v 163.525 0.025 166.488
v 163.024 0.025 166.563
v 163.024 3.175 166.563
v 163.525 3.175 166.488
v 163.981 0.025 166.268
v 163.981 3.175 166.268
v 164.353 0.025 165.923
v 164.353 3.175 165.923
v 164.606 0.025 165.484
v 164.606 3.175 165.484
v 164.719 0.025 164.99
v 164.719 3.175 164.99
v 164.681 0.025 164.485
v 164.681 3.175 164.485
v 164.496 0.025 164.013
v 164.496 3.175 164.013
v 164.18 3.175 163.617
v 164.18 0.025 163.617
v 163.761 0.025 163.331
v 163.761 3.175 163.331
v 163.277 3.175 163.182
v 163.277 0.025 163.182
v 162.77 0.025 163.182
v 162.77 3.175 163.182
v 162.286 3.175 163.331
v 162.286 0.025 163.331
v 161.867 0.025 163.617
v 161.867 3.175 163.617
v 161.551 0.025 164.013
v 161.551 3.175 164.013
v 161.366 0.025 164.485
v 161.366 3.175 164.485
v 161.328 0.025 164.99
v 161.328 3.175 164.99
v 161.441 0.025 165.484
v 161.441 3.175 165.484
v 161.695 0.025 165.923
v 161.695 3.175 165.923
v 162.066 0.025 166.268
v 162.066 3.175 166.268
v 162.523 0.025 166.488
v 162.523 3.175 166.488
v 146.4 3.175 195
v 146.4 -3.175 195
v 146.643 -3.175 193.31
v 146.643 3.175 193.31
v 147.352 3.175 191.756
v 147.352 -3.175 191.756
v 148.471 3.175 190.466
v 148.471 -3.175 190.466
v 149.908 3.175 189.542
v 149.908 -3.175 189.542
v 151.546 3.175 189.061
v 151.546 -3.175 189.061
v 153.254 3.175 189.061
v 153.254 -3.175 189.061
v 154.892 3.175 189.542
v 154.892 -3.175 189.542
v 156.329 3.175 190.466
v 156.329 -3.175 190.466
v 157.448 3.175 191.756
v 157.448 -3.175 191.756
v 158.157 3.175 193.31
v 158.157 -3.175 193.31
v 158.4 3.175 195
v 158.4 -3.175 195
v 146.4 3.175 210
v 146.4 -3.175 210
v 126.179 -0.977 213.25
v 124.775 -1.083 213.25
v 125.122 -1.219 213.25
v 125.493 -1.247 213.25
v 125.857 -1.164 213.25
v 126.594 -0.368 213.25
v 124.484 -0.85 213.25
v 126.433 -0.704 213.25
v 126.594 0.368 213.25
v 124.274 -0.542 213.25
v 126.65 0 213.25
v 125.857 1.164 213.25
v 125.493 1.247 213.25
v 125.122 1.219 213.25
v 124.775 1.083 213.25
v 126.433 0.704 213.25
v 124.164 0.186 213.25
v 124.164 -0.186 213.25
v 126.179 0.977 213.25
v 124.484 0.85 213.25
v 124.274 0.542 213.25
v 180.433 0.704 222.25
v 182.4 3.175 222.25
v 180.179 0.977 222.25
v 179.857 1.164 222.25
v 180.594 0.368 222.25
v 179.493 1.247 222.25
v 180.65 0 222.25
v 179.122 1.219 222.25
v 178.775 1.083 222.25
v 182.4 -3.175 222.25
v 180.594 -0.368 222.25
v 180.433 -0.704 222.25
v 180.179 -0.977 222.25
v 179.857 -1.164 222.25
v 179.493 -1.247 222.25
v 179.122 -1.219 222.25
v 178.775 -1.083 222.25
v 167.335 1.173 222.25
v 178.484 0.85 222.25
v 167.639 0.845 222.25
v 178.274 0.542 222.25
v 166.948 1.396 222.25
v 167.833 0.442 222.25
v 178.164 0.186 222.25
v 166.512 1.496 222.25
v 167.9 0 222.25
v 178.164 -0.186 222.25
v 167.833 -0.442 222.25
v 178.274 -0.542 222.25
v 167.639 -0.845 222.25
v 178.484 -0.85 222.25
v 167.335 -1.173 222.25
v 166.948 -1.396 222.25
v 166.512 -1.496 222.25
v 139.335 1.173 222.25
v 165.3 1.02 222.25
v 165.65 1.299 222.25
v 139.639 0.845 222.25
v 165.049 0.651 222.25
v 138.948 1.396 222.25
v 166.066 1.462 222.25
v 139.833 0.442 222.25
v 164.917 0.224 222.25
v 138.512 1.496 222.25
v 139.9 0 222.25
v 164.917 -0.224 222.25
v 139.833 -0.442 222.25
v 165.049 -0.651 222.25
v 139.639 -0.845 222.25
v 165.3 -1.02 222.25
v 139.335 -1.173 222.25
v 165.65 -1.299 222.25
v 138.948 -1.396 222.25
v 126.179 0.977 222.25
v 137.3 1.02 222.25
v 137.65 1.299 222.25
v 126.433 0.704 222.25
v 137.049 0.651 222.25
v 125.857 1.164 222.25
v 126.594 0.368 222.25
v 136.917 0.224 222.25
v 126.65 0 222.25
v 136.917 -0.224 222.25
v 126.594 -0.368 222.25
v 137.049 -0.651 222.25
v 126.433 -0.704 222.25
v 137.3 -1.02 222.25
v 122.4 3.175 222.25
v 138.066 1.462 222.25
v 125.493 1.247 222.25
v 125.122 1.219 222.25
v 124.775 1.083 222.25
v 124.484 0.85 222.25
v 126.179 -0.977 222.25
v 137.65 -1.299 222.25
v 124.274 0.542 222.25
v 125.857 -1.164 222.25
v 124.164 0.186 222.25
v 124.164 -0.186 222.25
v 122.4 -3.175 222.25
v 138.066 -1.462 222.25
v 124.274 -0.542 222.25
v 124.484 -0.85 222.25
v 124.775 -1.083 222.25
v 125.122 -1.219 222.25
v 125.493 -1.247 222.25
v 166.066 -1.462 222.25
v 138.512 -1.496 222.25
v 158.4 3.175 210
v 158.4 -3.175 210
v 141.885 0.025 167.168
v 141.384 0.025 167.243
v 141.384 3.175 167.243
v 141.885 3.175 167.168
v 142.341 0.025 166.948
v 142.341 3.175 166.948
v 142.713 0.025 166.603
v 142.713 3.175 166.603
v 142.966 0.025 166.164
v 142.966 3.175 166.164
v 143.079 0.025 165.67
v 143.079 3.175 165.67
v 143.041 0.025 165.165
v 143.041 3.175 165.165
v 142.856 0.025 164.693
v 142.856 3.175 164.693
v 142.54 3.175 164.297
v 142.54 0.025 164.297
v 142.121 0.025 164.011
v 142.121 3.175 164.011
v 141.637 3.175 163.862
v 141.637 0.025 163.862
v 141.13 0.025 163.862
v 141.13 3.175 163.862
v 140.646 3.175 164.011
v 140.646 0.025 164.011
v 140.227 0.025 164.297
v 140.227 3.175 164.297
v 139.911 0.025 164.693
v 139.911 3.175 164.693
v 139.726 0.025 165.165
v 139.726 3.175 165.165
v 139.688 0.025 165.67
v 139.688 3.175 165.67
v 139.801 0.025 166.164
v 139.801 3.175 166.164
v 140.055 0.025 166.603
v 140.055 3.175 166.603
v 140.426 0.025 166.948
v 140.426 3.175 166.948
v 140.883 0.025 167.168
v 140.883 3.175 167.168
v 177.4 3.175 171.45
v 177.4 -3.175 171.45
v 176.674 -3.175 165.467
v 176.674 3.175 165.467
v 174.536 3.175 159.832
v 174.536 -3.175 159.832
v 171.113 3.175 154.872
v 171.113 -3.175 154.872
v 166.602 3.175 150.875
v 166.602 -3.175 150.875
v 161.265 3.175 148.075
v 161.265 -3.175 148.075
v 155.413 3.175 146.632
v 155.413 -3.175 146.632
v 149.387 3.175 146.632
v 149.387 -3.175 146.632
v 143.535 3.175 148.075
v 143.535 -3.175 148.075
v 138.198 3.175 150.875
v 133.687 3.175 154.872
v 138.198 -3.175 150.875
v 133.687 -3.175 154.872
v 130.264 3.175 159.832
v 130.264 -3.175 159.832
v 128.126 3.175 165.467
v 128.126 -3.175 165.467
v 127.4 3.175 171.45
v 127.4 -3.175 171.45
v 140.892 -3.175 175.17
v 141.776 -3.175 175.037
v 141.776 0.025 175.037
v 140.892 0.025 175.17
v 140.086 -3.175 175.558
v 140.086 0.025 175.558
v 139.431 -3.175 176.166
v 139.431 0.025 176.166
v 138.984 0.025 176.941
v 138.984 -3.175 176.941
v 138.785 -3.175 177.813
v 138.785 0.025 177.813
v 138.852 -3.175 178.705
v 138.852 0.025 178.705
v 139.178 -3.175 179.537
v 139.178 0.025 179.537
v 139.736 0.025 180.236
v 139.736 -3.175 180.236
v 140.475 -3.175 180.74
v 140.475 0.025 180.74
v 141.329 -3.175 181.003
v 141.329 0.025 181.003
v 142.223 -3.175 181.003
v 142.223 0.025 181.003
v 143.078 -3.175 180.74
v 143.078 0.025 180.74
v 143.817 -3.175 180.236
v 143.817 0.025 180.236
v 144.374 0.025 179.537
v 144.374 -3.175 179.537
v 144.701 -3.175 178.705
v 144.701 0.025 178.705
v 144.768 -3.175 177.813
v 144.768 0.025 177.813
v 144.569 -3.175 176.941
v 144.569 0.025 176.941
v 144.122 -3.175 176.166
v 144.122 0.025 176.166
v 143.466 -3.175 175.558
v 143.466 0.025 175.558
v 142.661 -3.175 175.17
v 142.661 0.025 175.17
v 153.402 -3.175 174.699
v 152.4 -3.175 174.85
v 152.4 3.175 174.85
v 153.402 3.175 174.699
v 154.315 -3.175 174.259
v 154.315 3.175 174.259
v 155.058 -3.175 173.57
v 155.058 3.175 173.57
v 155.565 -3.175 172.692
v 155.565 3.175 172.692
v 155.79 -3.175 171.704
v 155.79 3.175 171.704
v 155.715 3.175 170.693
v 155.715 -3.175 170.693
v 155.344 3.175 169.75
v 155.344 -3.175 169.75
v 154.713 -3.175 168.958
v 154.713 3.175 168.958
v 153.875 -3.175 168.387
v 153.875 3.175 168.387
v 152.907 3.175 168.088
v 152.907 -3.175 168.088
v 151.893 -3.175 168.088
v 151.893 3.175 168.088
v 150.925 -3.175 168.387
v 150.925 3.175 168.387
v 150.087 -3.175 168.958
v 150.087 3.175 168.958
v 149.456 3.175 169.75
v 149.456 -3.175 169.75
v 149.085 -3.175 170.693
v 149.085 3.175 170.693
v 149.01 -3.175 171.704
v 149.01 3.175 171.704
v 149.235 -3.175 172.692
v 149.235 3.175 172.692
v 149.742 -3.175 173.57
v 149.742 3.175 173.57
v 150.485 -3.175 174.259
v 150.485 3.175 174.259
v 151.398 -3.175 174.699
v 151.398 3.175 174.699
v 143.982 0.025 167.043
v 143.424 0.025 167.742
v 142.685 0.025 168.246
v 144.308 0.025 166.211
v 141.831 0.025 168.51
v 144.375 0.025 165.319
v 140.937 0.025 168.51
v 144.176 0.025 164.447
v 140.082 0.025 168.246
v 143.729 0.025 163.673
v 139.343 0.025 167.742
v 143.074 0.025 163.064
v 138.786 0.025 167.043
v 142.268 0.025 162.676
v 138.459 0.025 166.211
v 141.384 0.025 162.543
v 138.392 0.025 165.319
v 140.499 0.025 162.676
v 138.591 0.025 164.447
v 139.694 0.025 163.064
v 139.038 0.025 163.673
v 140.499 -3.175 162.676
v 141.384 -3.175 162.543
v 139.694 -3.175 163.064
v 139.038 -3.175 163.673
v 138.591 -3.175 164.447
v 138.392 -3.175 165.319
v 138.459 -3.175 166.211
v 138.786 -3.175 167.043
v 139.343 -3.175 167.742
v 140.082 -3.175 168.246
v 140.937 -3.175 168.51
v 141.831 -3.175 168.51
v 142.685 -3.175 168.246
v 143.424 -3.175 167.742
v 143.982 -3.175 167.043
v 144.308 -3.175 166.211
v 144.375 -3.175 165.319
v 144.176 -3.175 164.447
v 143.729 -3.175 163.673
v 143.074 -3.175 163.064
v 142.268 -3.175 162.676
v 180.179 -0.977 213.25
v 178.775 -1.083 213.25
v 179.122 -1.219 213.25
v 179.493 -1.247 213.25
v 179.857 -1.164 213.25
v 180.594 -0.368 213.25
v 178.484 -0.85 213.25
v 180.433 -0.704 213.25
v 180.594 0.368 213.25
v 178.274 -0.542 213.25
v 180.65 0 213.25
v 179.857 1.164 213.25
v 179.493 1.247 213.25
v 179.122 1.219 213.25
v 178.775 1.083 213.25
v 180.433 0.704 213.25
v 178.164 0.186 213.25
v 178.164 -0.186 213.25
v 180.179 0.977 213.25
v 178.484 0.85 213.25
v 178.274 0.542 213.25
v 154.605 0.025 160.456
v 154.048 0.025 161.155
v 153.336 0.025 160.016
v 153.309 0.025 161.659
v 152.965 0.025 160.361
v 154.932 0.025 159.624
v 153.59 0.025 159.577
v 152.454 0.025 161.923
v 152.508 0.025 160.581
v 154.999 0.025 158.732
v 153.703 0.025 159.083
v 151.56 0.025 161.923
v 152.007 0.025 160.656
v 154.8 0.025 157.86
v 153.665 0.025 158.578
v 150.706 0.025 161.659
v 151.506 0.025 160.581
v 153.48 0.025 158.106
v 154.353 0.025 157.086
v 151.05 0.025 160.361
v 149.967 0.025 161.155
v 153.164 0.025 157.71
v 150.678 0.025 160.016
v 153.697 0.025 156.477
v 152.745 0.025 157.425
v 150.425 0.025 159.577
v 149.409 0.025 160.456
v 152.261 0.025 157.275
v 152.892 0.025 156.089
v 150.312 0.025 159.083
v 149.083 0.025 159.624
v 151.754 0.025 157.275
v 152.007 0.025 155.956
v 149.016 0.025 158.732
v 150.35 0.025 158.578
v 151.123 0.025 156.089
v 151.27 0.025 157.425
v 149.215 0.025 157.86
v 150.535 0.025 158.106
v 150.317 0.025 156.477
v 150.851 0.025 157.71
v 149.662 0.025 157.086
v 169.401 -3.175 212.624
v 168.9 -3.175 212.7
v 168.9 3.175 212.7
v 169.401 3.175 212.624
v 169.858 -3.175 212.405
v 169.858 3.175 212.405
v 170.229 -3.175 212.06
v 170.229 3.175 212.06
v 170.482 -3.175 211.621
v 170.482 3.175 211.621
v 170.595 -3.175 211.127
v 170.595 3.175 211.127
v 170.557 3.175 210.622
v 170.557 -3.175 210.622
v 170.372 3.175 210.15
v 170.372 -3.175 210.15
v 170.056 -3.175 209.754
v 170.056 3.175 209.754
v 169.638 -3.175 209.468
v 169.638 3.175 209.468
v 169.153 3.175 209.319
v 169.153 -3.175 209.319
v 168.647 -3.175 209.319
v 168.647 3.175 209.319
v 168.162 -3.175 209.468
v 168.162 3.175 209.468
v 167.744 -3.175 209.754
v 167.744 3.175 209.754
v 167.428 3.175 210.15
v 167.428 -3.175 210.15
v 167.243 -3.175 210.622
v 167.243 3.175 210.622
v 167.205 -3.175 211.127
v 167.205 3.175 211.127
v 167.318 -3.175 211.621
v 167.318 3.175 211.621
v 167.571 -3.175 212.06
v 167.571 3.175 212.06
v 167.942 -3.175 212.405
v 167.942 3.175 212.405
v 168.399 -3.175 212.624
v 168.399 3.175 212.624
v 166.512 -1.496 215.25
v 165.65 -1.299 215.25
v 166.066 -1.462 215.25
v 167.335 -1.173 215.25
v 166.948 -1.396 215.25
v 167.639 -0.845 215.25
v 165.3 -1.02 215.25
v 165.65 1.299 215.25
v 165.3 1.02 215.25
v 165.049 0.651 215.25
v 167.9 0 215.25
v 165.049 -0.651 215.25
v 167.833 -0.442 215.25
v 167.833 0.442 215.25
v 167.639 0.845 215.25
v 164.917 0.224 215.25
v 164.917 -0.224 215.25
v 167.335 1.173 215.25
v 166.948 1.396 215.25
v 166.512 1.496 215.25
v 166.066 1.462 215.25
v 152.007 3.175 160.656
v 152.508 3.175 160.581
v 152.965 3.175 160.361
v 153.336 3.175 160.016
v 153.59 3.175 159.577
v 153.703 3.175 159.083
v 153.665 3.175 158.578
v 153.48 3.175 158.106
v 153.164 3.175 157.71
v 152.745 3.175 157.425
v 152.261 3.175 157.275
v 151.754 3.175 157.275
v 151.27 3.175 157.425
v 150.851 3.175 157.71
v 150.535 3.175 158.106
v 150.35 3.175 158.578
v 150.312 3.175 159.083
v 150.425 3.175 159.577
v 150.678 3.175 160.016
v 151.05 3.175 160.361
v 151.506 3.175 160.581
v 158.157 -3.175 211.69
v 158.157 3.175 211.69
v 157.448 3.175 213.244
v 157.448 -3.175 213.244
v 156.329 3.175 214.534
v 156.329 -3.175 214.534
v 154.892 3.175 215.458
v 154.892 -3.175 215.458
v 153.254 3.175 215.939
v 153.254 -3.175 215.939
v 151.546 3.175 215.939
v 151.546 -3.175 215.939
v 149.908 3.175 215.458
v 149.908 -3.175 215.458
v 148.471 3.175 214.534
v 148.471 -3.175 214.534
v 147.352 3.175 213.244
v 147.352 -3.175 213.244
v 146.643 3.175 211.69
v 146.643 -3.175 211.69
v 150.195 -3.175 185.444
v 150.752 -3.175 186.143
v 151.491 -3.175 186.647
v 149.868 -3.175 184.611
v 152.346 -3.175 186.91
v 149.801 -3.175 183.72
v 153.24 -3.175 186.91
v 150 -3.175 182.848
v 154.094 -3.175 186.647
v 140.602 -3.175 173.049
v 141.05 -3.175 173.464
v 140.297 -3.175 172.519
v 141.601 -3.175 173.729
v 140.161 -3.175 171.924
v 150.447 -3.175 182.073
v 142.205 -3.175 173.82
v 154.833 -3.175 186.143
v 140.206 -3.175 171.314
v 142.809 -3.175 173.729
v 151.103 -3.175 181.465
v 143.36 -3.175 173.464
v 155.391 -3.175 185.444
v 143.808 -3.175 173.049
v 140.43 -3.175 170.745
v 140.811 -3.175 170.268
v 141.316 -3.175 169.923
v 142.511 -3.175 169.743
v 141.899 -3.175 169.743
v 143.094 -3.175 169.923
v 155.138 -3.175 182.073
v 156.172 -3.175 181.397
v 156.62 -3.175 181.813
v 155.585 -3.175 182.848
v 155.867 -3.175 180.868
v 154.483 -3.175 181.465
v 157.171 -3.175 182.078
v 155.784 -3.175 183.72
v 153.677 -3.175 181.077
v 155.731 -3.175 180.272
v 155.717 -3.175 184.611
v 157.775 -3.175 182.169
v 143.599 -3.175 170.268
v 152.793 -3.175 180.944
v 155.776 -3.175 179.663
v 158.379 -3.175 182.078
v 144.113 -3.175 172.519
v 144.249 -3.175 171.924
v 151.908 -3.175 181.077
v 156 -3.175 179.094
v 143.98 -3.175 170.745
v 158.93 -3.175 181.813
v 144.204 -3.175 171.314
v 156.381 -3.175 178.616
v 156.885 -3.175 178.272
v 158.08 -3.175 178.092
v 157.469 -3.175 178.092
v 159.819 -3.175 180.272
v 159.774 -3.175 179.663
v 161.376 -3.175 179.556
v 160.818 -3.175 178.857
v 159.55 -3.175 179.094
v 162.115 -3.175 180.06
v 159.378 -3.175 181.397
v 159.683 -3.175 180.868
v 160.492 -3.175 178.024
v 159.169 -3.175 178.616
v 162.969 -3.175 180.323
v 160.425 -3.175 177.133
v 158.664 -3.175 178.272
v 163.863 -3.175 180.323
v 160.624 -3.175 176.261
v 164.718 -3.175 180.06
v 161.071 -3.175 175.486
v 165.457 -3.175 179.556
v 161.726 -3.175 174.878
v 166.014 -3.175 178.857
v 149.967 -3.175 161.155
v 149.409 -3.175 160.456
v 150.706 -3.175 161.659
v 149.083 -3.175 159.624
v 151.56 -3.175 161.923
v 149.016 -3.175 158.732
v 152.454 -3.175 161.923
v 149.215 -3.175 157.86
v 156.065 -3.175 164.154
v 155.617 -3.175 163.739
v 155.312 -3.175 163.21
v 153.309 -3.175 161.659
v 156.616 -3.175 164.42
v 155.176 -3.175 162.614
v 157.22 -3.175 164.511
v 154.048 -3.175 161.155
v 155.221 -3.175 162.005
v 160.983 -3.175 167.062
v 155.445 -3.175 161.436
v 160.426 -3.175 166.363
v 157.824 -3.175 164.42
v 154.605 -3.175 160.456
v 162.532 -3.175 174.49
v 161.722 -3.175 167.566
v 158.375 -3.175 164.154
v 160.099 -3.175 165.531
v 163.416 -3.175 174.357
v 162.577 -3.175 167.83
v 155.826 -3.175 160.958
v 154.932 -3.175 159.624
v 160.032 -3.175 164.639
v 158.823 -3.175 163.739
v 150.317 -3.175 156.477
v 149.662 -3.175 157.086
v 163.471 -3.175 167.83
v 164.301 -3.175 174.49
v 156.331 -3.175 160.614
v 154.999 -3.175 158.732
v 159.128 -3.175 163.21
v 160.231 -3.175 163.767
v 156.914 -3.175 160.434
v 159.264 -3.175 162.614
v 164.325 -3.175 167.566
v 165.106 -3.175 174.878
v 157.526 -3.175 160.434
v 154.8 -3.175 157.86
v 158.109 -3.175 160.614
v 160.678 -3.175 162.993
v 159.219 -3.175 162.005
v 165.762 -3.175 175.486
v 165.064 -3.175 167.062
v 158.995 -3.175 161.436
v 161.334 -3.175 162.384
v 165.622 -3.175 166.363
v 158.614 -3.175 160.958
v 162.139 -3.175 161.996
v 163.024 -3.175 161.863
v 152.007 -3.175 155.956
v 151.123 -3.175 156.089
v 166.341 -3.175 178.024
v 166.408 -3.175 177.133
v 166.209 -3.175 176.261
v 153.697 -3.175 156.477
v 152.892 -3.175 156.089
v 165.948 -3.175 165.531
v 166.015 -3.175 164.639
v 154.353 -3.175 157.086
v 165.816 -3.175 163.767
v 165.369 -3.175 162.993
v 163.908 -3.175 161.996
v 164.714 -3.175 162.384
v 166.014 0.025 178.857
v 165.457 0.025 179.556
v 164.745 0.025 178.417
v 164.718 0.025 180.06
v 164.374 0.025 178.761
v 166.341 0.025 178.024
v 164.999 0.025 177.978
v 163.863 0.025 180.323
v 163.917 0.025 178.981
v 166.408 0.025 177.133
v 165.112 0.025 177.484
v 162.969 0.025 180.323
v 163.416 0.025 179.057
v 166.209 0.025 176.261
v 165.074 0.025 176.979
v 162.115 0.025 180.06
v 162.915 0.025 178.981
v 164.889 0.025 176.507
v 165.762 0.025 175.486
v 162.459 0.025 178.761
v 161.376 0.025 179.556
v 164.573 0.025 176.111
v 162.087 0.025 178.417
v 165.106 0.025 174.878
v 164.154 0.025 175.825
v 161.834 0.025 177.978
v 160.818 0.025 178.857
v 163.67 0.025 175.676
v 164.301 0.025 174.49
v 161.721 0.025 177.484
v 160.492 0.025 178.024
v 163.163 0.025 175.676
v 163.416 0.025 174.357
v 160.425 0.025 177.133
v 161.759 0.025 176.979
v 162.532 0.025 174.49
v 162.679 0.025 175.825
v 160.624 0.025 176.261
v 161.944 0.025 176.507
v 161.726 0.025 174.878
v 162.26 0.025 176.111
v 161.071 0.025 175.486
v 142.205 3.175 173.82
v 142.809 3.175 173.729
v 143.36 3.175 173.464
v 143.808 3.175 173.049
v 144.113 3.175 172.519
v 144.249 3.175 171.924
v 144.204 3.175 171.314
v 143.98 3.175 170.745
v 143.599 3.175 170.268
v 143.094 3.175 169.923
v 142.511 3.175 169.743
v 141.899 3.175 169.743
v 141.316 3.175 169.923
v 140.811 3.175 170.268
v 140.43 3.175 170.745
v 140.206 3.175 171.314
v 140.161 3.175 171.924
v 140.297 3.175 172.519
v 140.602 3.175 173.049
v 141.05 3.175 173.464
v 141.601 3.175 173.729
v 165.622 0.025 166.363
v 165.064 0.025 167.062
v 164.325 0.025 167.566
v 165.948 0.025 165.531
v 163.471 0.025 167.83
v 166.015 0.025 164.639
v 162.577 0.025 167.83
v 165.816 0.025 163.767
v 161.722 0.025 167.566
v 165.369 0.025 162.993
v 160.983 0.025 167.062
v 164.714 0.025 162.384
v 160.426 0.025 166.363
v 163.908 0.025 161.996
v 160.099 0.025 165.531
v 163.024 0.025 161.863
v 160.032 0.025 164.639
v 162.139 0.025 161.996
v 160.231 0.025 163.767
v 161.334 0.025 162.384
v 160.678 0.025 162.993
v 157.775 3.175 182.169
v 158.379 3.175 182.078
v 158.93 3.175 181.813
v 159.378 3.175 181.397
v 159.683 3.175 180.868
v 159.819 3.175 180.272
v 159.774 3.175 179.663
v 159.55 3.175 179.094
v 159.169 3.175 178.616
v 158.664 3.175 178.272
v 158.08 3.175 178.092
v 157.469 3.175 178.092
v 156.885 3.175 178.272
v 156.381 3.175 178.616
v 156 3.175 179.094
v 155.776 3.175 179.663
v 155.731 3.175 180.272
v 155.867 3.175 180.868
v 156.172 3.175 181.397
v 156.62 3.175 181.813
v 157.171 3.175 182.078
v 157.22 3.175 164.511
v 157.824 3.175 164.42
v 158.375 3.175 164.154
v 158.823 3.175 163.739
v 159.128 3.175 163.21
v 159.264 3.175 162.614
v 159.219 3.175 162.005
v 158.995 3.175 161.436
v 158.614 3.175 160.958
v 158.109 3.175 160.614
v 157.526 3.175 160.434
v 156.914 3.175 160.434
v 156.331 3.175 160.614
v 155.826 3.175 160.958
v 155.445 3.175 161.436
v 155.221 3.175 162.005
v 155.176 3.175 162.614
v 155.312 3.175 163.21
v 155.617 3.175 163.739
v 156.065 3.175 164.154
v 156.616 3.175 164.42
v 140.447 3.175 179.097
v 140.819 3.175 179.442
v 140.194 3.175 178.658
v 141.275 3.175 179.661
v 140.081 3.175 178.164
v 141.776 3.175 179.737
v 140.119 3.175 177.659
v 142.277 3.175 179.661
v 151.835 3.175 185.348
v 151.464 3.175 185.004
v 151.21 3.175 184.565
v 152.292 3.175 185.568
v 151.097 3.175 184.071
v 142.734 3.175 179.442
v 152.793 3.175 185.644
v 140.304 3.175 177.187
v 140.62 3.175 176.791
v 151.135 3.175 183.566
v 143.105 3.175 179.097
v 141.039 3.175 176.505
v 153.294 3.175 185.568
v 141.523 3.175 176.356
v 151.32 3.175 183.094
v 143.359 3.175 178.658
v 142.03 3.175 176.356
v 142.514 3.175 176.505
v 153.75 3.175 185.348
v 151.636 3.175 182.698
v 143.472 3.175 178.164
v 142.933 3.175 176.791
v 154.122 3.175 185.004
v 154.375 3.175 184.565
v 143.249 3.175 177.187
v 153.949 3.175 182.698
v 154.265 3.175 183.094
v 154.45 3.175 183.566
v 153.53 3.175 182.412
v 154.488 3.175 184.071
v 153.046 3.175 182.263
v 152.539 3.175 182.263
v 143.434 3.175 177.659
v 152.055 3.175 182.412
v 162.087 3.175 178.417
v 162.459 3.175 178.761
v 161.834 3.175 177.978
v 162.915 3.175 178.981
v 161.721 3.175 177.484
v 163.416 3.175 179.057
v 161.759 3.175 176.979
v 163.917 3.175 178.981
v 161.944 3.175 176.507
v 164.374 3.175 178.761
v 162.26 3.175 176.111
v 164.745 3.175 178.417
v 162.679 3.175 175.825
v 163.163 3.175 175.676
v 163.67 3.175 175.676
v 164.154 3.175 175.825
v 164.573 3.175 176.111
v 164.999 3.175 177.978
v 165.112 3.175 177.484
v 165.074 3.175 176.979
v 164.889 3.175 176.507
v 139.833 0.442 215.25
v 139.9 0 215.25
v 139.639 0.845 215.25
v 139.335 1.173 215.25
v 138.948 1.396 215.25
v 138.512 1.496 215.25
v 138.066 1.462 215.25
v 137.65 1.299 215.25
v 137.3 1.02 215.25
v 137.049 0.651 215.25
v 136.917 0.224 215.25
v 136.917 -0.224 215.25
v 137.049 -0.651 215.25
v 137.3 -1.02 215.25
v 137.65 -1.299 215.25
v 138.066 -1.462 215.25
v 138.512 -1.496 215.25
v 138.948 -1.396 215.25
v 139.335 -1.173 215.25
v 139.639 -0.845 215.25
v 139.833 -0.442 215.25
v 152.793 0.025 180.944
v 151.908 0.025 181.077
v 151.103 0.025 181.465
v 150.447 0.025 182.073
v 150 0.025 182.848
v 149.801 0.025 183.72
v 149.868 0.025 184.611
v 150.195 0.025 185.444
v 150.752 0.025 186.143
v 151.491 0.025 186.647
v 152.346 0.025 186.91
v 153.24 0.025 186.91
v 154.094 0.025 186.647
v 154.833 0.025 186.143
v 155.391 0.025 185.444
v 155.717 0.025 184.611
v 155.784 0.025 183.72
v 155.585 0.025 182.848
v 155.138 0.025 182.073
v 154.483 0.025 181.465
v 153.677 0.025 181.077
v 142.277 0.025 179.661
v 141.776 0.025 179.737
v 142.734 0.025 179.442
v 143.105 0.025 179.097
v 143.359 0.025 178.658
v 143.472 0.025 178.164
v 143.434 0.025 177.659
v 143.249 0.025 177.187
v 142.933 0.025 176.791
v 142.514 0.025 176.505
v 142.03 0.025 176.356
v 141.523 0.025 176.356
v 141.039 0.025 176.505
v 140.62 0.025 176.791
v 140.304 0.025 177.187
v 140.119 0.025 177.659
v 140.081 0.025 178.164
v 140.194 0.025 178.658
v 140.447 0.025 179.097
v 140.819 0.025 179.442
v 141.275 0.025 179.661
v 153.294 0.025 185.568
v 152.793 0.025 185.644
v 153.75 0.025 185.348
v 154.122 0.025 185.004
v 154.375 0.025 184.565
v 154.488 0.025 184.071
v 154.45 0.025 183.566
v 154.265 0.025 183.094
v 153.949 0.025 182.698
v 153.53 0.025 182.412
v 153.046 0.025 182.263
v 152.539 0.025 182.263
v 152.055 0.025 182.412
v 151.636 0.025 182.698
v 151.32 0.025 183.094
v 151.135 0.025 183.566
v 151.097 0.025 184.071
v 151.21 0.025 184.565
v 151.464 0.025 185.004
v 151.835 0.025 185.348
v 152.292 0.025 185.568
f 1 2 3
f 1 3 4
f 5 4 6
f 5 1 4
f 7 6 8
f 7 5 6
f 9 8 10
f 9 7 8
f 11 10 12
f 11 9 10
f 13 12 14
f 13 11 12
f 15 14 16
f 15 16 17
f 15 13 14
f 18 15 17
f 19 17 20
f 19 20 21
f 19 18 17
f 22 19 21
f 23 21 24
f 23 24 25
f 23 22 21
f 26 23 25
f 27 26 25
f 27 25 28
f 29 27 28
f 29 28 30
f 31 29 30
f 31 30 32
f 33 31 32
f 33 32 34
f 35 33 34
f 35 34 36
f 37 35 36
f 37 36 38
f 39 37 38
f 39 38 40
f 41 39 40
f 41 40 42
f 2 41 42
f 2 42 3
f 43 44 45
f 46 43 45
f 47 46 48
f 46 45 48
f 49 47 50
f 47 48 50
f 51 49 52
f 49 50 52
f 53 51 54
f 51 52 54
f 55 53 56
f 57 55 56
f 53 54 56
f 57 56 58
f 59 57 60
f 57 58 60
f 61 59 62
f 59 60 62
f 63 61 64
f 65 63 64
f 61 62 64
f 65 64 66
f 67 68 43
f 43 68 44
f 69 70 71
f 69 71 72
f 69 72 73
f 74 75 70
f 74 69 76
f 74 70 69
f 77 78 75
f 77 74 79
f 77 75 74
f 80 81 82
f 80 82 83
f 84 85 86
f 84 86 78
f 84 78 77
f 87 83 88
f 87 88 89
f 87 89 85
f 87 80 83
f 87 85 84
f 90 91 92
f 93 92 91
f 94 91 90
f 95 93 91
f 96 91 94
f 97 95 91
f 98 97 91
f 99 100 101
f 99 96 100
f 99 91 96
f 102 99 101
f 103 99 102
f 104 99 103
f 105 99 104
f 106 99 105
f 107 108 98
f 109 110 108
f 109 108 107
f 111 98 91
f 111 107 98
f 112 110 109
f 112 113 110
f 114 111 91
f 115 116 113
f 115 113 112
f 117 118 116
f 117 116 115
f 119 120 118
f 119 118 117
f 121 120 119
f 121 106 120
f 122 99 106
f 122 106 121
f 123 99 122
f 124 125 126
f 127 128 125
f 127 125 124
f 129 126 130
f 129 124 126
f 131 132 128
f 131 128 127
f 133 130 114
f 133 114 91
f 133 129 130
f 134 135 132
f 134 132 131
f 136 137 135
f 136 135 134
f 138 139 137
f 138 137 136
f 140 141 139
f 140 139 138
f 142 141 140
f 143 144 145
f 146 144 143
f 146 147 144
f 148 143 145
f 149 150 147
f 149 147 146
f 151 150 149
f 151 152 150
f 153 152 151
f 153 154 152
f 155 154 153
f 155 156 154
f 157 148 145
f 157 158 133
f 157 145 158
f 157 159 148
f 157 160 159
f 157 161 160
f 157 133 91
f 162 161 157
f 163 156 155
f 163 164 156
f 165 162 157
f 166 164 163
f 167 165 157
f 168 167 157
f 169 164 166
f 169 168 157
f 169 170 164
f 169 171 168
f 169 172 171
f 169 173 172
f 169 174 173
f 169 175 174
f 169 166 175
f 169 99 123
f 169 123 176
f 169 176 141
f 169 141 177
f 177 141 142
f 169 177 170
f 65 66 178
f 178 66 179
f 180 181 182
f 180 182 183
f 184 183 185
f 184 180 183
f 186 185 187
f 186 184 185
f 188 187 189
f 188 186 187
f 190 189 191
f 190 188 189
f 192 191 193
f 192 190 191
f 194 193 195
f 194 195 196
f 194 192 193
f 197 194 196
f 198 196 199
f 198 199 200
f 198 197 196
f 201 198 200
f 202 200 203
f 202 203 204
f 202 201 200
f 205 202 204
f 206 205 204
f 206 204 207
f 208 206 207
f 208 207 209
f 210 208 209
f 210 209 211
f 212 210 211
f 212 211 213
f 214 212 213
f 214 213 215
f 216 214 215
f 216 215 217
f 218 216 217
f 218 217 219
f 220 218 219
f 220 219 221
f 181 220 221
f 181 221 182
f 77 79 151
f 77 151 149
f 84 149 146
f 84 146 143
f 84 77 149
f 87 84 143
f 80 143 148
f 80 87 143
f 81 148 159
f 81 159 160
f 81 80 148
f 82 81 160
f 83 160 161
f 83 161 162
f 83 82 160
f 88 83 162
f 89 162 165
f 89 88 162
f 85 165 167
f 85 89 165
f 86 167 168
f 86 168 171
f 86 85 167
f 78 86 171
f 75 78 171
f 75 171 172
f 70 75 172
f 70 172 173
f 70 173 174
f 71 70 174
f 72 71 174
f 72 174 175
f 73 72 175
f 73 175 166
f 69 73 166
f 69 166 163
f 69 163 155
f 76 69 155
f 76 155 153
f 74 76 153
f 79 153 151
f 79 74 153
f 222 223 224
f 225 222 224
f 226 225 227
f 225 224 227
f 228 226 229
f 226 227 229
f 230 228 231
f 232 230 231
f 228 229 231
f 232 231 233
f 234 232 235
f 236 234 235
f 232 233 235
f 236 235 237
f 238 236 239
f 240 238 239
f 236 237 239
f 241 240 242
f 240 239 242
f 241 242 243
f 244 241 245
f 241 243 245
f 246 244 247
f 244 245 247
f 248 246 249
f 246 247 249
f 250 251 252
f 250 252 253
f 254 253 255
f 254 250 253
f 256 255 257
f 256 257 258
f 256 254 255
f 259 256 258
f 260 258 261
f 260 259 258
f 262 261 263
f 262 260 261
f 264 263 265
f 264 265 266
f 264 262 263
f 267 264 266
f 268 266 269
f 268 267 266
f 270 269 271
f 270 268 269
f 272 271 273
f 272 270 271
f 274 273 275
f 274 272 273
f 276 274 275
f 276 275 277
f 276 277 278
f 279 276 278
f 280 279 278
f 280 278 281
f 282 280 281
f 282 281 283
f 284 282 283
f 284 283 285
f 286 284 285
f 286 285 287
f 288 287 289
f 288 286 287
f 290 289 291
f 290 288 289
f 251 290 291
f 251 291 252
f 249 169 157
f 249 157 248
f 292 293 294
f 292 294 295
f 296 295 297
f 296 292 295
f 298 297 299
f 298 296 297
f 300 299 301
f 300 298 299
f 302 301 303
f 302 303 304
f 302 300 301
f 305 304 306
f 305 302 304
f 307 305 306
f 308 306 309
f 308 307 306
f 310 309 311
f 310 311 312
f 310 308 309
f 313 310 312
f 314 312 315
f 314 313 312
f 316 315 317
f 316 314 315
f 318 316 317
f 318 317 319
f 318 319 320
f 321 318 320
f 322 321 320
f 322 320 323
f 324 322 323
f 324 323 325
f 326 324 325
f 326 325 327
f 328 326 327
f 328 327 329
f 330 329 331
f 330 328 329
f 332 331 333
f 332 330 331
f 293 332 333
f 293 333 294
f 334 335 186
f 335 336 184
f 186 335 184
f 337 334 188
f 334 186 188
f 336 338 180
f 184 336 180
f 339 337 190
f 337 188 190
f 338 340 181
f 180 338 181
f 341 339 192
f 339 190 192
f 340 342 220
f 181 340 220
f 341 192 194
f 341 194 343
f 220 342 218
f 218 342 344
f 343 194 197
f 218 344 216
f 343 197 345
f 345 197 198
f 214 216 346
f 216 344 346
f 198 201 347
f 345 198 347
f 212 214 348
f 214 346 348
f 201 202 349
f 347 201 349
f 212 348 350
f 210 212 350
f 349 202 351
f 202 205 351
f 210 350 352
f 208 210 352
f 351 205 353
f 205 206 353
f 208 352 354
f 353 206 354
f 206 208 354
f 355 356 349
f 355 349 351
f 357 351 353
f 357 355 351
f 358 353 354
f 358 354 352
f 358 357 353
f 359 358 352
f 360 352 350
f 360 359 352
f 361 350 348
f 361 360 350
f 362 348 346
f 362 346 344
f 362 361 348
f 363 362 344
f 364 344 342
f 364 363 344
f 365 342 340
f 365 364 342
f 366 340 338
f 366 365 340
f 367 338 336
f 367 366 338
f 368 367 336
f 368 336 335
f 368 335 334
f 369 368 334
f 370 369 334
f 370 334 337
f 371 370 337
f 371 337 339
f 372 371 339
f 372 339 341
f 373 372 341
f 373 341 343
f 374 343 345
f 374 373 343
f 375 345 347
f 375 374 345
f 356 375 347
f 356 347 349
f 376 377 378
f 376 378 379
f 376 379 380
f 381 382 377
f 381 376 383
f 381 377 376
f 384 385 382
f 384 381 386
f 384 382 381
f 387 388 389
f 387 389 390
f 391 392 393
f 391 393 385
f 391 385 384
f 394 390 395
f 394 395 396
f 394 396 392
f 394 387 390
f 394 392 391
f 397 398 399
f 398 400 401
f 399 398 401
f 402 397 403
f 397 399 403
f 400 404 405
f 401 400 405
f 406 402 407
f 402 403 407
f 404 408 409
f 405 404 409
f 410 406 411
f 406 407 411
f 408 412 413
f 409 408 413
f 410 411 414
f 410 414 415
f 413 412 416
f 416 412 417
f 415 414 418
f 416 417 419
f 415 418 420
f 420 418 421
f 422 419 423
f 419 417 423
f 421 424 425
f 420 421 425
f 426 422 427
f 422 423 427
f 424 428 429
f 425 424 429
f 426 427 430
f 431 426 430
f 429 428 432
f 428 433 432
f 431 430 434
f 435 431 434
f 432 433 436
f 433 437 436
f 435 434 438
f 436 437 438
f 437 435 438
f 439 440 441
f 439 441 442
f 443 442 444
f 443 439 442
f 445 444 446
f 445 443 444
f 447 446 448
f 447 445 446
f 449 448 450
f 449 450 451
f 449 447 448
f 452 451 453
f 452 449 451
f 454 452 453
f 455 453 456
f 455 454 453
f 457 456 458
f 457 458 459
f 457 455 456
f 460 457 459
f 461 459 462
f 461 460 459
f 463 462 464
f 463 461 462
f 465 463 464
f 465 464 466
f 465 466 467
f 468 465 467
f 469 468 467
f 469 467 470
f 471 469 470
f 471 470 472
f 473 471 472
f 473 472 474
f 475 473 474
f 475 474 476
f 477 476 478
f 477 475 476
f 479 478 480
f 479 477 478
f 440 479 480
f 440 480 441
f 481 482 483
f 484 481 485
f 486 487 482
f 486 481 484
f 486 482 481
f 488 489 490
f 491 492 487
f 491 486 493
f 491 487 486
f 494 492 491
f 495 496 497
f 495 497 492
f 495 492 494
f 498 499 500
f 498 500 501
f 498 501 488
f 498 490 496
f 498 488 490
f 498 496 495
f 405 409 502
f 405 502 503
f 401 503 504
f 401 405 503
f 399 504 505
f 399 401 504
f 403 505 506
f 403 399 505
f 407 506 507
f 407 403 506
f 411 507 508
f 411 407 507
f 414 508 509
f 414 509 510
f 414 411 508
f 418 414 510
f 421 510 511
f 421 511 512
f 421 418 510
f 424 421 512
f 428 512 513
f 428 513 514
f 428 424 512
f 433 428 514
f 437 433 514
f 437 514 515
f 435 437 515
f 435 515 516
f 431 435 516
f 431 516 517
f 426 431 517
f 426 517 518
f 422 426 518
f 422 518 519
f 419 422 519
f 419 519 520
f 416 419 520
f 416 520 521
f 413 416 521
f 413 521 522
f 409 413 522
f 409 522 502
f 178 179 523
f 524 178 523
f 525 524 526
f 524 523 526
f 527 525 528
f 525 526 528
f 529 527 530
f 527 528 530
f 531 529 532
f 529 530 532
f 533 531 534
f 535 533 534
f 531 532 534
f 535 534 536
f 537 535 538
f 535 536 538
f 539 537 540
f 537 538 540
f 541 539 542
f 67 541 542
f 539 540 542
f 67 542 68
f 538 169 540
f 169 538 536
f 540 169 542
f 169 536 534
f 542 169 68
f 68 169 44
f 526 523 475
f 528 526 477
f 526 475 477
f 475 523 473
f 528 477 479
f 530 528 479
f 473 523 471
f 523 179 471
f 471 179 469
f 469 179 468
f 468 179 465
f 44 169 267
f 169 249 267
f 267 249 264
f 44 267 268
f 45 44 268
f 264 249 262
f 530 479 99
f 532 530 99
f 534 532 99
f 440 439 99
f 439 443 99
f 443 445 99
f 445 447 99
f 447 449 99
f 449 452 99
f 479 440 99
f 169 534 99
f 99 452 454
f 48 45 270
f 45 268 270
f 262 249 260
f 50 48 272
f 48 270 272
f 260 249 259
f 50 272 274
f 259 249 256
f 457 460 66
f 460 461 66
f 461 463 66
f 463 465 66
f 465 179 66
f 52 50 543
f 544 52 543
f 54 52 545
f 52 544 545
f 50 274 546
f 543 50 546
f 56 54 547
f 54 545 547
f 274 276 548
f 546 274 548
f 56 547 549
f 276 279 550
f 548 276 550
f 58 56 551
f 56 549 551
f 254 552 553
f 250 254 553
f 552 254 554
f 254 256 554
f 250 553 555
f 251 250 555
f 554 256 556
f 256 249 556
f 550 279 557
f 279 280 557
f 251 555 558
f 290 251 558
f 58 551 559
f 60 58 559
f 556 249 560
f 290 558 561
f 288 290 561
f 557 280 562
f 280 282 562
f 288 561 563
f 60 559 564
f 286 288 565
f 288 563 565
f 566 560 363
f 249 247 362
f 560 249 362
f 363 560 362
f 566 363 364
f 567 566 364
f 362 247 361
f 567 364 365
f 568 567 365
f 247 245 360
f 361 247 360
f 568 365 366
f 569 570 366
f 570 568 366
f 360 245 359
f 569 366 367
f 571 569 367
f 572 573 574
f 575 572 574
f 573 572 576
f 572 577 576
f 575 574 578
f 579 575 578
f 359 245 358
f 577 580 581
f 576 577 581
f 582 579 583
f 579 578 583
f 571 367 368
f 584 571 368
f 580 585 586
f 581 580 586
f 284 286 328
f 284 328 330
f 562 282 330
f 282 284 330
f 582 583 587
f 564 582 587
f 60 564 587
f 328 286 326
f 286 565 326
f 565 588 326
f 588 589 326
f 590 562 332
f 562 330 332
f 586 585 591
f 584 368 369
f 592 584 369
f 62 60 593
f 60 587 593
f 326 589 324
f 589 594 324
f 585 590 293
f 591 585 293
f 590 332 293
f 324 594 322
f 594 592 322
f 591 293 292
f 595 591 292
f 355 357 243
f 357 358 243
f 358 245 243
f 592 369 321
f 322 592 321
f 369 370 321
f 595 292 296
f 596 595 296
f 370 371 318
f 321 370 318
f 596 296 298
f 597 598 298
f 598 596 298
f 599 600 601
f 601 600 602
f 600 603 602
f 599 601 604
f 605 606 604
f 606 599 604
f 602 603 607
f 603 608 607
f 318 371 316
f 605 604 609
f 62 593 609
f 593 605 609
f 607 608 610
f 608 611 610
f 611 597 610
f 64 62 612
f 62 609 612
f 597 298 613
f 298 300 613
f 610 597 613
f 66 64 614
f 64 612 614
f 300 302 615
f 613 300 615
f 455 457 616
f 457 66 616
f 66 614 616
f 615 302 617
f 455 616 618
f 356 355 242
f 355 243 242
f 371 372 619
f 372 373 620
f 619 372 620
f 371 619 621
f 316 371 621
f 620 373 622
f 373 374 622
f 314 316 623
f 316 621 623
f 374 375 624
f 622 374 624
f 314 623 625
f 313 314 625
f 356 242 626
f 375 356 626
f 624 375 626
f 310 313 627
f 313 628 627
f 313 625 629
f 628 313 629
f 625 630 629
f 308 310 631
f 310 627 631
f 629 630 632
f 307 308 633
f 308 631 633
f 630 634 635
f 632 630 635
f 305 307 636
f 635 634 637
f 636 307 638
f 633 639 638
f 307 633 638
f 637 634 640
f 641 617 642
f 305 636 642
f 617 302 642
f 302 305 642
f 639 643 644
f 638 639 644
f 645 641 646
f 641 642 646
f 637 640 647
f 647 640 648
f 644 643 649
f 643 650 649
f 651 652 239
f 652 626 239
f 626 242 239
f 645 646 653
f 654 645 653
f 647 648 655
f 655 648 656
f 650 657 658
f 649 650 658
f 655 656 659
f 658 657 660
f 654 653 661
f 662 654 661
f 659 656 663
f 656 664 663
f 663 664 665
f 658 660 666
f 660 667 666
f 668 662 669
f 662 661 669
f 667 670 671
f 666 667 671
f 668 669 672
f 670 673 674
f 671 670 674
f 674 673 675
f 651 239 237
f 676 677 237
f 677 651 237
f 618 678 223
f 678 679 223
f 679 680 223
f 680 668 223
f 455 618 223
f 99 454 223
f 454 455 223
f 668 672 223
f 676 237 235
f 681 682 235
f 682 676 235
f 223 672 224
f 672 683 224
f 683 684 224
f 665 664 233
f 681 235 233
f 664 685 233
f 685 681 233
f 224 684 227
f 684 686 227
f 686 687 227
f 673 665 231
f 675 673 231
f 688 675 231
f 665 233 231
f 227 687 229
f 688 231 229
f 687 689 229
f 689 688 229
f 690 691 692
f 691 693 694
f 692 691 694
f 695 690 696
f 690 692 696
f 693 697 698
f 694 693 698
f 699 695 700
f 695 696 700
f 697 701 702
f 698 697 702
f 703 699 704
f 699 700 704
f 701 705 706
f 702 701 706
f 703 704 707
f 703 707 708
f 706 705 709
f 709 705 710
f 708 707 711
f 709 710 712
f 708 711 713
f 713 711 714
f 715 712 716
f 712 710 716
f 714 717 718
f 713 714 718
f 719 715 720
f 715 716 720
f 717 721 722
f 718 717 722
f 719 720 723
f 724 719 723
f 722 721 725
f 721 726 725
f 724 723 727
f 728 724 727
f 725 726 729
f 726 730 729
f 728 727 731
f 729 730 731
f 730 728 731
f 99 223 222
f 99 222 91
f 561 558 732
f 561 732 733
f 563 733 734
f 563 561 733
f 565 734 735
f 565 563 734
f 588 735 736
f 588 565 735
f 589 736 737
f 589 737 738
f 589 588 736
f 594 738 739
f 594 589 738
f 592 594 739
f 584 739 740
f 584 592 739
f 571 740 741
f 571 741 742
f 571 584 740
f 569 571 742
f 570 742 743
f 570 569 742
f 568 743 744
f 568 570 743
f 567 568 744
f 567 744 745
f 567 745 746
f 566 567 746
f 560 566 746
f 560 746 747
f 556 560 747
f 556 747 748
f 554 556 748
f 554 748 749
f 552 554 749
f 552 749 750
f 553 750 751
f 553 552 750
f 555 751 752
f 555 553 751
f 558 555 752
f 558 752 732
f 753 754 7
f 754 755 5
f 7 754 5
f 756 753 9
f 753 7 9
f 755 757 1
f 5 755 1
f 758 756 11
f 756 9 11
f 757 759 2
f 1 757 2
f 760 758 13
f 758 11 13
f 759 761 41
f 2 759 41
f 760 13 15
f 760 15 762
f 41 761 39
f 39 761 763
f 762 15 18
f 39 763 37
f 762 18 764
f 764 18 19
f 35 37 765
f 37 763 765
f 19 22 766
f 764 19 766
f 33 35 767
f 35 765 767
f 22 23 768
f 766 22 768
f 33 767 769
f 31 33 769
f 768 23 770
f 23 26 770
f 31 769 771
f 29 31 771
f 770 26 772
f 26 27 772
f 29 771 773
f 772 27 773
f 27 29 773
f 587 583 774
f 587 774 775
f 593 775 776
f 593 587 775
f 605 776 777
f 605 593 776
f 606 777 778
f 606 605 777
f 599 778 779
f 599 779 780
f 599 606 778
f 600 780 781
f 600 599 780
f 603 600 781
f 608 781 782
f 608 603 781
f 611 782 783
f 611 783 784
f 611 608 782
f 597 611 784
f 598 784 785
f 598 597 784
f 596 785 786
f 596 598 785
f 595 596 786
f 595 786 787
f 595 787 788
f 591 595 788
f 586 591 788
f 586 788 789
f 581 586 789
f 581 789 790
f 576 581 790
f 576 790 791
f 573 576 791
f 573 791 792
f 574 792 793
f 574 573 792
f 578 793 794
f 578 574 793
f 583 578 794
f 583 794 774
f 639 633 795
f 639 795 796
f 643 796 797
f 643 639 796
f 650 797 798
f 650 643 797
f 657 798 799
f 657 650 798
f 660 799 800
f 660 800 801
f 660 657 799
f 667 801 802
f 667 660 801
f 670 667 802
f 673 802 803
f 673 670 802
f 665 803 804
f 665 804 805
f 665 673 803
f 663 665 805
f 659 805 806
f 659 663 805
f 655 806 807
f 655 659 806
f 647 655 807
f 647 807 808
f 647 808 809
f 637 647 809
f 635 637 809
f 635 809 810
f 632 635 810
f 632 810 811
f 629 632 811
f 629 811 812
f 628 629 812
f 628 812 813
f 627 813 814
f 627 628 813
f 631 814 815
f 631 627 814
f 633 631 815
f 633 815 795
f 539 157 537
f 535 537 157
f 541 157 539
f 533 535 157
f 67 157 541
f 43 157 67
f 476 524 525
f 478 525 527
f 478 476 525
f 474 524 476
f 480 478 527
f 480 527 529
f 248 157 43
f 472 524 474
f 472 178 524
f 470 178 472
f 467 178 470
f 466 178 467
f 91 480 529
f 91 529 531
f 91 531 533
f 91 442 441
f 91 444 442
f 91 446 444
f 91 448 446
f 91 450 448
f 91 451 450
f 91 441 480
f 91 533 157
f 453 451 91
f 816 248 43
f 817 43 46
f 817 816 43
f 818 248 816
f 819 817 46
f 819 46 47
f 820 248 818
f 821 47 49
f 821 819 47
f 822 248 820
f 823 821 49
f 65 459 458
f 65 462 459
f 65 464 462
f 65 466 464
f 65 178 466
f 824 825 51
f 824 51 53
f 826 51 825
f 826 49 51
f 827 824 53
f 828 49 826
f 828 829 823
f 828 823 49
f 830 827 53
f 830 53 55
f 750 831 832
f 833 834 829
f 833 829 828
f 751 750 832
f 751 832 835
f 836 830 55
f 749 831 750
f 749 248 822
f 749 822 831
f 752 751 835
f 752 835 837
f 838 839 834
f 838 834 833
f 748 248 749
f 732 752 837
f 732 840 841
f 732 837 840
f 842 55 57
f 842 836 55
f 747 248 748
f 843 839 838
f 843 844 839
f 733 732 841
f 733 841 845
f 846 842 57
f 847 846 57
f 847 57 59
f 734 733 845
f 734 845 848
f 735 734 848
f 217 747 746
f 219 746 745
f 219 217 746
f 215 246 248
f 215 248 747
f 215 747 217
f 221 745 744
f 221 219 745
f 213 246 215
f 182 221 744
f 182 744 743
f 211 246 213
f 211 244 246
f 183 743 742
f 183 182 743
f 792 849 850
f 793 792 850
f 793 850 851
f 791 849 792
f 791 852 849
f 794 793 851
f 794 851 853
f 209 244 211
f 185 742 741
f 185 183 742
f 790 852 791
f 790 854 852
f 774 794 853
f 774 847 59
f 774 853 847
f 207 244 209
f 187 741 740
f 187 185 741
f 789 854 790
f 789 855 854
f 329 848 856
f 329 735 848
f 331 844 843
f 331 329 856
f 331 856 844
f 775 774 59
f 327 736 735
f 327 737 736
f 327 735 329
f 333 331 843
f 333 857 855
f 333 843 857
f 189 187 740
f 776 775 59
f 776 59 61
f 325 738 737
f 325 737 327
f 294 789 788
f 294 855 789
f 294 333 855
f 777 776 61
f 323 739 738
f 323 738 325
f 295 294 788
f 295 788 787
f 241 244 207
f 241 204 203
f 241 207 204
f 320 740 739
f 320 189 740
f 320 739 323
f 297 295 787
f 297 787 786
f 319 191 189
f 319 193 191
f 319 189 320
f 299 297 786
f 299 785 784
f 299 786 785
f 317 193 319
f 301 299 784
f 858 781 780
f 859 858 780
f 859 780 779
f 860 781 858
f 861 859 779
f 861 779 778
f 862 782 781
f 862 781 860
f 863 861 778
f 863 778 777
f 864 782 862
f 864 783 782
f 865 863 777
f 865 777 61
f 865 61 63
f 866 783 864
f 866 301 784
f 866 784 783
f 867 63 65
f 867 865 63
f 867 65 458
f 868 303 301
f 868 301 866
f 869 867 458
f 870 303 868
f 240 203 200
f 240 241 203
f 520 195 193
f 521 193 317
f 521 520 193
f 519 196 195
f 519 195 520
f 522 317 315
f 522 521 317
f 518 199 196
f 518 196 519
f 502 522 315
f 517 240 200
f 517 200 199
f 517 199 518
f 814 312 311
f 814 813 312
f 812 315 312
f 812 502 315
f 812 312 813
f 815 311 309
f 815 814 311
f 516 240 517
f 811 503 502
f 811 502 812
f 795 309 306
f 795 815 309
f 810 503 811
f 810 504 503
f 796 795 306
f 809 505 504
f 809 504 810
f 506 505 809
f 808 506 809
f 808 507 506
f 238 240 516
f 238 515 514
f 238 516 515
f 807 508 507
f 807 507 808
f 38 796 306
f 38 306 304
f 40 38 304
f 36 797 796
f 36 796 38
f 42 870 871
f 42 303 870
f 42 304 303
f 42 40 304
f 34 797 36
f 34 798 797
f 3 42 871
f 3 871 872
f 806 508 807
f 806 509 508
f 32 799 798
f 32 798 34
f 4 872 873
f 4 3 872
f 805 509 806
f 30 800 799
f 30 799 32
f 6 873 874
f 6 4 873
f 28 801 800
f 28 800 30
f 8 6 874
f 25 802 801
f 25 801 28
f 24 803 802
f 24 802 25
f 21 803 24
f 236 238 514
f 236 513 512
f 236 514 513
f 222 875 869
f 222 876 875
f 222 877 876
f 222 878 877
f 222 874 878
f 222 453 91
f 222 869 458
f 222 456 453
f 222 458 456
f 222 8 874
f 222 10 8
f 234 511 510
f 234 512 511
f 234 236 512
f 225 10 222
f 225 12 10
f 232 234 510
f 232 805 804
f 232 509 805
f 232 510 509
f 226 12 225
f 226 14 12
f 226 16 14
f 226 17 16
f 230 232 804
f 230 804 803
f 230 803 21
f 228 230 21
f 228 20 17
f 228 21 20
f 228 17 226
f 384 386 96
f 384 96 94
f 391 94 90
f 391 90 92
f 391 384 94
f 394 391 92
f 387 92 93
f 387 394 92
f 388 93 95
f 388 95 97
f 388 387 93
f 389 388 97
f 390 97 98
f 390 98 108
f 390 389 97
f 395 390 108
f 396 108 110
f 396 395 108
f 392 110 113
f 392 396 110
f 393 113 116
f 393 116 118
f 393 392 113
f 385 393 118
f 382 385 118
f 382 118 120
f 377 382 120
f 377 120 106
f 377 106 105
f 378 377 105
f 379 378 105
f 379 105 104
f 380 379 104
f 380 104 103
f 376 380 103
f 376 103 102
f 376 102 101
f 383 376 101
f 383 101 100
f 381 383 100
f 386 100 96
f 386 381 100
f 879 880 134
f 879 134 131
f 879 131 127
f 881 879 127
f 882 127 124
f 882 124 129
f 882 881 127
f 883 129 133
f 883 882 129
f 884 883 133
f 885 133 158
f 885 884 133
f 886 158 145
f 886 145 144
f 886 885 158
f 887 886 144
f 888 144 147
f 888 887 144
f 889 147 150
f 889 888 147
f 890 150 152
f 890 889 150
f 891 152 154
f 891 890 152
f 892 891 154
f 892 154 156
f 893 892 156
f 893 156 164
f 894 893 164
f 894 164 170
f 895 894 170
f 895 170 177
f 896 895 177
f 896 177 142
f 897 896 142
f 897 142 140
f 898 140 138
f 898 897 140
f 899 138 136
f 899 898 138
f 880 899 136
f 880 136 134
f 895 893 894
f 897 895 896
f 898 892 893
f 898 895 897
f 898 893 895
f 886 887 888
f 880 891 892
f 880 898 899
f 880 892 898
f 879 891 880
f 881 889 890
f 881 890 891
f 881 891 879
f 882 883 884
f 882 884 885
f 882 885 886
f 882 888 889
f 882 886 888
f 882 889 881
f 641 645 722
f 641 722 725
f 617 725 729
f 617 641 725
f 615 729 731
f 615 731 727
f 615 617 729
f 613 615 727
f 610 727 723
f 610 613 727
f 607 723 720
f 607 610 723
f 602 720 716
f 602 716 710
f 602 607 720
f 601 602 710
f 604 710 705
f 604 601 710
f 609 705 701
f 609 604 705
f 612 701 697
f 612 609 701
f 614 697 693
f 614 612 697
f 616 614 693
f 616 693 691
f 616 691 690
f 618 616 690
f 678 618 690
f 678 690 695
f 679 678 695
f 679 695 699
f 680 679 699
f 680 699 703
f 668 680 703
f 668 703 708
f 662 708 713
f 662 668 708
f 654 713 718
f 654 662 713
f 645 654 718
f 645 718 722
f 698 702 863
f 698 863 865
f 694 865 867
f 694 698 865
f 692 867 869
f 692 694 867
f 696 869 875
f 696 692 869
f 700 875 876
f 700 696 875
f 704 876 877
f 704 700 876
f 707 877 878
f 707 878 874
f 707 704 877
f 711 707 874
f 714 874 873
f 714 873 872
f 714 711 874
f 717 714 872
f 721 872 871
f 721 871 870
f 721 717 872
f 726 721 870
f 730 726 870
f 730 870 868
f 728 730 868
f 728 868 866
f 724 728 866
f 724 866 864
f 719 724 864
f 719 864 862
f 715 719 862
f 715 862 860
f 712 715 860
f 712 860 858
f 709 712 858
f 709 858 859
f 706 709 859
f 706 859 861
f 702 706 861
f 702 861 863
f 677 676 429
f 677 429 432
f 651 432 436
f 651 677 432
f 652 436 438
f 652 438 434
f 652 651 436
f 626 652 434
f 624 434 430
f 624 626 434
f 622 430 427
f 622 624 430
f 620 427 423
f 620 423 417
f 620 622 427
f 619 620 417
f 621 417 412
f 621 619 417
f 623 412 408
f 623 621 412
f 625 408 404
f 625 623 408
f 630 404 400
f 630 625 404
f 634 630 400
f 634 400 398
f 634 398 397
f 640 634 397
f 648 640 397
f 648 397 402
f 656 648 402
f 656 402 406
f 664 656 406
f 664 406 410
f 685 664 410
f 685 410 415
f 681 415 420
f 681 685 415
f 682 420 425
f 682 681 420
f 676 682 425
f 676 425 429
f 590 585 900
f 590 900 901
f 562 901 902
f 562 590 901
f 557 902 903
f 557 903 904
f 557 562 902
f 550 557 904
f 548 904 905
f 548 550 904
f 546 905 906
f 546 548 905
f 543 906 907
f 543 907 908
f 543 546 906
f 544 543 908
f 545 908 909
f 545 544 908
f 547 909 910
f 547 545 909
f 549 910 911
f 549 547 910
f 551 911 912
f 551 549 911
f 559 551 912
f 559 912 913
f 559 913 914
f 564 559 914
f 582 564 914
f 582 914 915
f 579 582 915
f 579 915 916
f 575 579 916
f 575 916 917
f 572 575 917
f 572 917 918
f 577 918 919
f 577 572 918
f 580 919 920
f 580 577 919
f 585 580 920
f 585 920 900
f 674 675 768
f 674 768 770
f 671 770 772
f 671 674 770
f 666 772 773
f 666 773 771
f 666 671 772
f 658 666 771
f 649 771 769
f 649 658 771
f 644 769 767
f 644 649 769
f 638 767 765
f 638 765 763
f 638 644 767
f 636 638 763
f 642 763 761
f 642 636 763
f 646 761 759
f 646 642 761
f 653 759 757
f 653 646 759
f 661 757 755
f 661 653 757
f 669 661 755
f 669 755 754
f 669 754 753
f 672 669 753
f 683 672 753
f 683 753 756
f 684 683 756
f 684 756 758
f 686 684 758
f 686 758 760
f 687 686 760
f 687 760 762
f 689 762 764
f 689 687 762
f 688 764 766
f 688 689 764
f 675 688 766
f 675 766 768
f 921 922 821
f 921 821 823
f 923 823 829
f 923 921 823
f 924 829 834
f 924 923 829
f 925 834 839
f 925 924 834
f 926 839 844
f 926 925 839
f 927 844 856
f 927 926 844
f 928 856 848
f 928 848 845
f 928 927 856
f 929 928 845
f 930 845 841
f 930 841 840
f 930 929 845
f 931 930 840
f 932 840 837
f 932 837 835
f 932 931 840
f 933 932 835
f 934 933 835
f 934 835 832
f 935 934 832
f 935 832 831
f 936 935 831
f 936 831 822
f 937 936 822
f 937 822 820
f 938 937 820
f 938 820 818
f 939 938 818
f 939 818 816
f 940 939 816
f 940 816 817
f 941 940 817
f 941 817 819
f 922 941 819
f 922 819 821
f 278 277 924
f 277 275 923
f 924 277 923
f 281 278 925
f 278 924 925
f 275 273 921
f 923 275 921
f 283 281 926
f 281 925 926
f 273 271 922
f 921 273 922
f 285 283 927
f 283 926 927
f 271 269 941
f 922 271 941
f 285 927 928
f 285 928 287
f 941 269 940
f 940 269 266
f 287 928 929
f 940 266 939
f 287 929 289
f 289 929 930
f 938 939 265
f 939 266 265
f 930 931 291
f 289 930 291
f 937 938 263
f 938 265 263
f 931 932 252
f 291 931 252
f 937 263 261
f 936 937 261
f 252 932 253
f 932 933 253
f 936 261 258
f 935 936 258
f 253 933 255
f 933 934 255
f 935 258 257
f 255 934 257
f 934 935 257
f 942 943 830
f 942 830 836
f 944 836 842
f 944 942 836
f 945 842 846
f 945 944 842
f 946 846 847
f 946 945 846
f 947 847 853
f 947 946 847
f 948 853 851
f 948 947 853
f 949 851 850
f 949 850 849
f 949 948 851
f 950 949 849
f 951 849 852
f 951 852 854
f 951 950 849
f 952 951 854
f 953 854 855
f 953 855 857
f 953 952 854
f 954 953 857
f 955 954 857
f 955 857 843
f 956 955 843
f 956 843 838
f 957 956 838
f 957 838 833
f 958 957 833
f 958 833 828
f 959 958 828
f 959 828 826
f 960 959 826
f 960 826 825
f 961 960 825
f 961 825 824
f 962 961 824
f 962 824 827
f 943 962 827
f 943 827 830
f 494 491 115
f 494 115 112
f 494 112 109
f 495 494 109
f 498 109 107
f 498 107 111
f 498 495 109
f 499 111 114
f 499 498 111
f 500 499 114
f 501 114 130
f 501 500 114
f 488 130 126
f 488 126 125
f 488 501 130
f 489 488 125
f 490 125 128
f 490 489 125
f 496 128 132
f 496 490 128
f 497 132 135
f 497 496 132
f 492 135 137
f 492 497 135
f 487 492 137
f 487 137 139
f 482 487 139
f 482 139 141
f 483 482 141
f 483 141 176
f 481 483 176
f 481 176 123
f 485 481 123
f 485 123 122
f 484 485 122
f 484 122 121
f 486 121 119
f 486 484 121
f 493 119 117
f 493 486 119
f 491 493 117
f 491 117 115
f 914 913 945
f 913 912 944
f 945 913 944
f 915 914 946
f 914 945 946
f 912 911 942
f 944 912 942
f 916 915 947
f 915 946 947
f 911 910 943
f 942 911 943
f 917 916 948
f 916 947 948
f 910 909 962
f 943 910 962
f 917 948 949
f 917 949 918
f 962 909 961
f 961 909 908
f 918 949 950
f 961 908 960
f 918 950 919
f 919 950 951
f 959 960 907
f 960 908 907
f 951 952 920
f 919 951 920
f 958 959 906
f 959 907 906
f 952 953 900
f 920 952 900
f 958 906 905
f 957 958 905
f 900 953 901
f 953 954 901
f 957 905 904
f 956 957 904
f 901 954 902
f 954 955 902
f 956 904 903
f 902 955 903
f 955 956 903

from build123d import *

# Parameters (mm, degrees)
PLACA_ANTEBRAZO_START          = -3.175
PLACA_ANTEBRAZO_DEPTH          = 6.35
PLACA_ANTEBRAZO_REDONDEO_START = -3.175
CROQUIS13_R                    = 25
PLACA_ANTEBRAZO_REDONDEO_DEPTH = 6.35
BARRENOS_J3_START              = -3.175
CROQUIS14_R                    = 1.7
CROQUIS14_R_2                  = 2.05
CROQUIS14_R_3                  = 3.4
BARRENOS_J3_DEPTH              = 6.35
REFRENTADOS_J3_START           = -3.175
CROQUIS15_R                    = 3
REFRENTADOS_J3_DEPTH           = 3.2
ALIGERADO_PASO_CABLE_START     = -3.175
ALIGERADO_PASO_CABLE_DEPTH     = 6.35
ROSCA_M3_CANTO_START           = 213.25
CROQUIS17_R                    = 1.25
ROSCA_M3_CANTO_DEPTH           = 9
PASADORES_D3_START             = 215.25
CROQUIS18_R                    = 1.5
PASADORES_D3_DEPTH             = 7
PASO_M3_BASES_CINCHO_START     = -3.175
CROQUIS20_R                    = 1.7
PASO_M3_BASES_CINCHO_DEPTH     = 6.35


with BuildPart() as part:
    # Croquis12 → Placa_antebrazo (new body)
    with BuildSketch(Plane(origin=(0, 0, 0), x_dir=(1, 0, 0), z_dir=(0, 1, 0)).offset(PLACA_ANTEBRAZO_START)):
        Polygon((127.4, -171.45), (177.4, -171.45), (182.4, -222.25), (122.4, -222.25), align=None)
    extrude(amount=PLACA_ANTEBRAZO_DEPTH)

    # Croquis13 → Placa_antebrazo_redondeo (add)
    with BuildSketch(Plane(origin=(0, 0, 0), x_dir=(1, 0, 0), z_dir=(0, 1, 0)).offset(PLACA_ANTEBRAZO_REDONDEO_START)):
        with Locations((152.4, -171.45)):
            Circle(CROQUIS13_R)
    extrude(amount=PLACA_ANTEBRAZO_REDONDEO_DEPTH)

    # Croquis14 → Barrenos_J3 (cut)
    with BuildSketch(Plane(origin=(0, 0, 0), x_dir=(1, 0, 0), z_dir=(0, 1, 0)).offset(BARRENOS_J3_START)):
        with Locations((163.416293151, -177.356884561)):
            Circle(CROQUIS14_R)
        with Locations((152.792634488, -183.943832005)):
            Circle(CROQUIS14_R)
        with Locations((141.776341338, -178.036947444)):
            Circle(CROQUIS14_R)
        with Locations((141.383706849, -165.543115439)):
            Circle(CROQUIS14_R)
        with Locations((152.007365512, -158.956167995)):
            Circle(CROQUIS14_R)
        with Locations((163.023658662, -164.863052556)):
            Circle(CROQUIS14_R)
        with Locations((157.774949114, -180.118905468)):
            Circle(CROQUIS14_R_2)
        with Locations((142.205033084, -171.770389743)):
            Circle(CROQUIS14_R_2)
        with Locations((157.220017802, -162.460704789)):
            Circle(CROQUIS14_R_2)
        with Locations((152.4, -171.45)):
            Circle(CROQUIS14_R_3)
    extrude(amount=BARRENOS_J3_DEPTH, mode=Mode.SUBTRACT)

    # Croquis15 → Refrentados_J3 (cut)
    with BuildSketch(Plane(origin=(0, 0, 0), x_dir=(1, 0, 0), z_dir=(0, 1, 0)).offset(REFRENTADOS_J3_START)):
        with Locations((163.416293151, -177.356884561)):
            Circle(CROQUIS15_R)
        with Locations((152.792634488, -183.943832005)):
            Circle(CROQUIS15_R)
        with Locations((141.776341338, -178.036947444)):
            Circle(CROQUIS15_R)
        with Locations((141.383706849, -165.543115439)):
            Circle(CROQUIS15_R)
        with Locations((152.007365512, -158.956167995)):
            Circle(CROQUIS15_R)
        with Locations((163.023658662, -164.863052556)):
            Circle(CROQUIS15_R)
    extrude(amount=REFRENTADOS_J3_DEPTH, mode=Mode.SUBTRACT)

    # Croquis16 → Aligerado_paso_cable (cut)
    with BuildSketch(Plane(origin=(0, 0, 0), x_dir=(1, 0, 0), z_dir=(0, 1, 0)).offset(ALIGERADO_PASO_CABLE_START)):
        with BuildLine():
            Line((158.4, -195), (158.4, -210))
            ThreePointArc((158.4, -210), (152.4, -216), (146.4, -210))
            Line((146.4, -210), (146.4, -195))
            ThreePointArc((146.4, -195), (152.4, -189), (158.4, -195))
        make_face()
    extrude(amount=ALIGERADO_PASO_CABLE_DEPTH, mode=Mode.SUBTRACT)

    # Croquis17 → Rosca_M3_canto (cut)
    with BuildSketch(Plane.XY.offset(ROSCA_M3_CANTO_START)):
        with Locations((125.4, 0)):
            Circle(CROQUIS17_R)
        with Locations((179.4, 0)):
            Circle(CROQUIS17_R)
    extrude(amount=ROSCA_M3_CANTO_DEPTH, mode=Mode.SUBTRACT)

    # Croquis18 → Pasadores_D3 (cut)
    with BuildSketch(Plane.XY.offset(PASADORES_D3_START)):
        with Locations((138.4, 0)):
            Circle(CROQUIS18_R)
        with Locations((166.4, 0)):
            Circle(CROQUIS18_R)
    extrude(amount=PASADORES_D3_DEPTH, mode=Mode.SUBTRACT)

    # Croquis20 → Paso_M3_bases_cincho (cut)
    with BuildSketch(Plane(origin=(0, 0, 0), x_dir=(1, 0, 0), z_dir=(0, 1, 0)).offset(PASO_M3_BASES_CINCHO_START)):
        with Locations((168.9, -211)):
            Circle(CROQUIS20_R)
    extrude(amount=PASO_M3_BASES_CINCHO_DEPTH, mode=Mode.SUBTRACT)


solid = part.part
